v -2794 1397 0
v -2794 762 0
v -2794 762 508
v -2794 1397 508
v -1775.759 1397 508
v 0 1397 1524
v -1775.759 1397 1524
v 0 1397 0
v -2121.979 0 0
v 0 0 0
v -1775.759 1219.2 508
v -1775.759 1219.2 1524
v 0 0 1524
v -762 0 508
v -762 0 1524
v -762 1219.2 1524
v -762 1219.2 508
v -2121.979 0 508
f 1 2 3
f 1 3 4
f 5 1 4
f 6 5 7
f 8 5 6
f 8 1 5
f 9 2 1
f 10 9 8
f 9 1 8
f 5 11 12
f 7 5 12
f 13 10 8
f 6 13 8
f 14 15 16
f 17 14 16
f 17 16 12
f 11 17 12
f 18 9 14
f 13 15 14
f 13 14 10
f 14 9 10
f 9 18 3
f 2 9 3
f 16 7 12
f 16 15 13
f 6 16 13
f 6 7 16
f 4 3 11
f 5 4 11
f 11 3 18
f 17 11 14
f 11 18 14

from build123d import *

# Parameters (mm, degrees)
F0_W     = 2794
F0_H     = 1397
F1_DEPTH = 1524
F4_DEPTH = 1016
F5_W     = 1018.2407798767
F5_H     = 1016
F6_DEPTH = 3329.94
F8_DEPTH = 1772.92


with BuildPart() as f1:
    # F0 (on Top) → F1 (new body)
    with BuildSketch(Plane.XY):
        with Locations((-1397, 698.5)):
            Rectangle(F0_W, F0_H)
    extrude(amount=F1_DEPTH)

    # F3 (on face) → F4 (cut)
    with BuildSketch(Plane.XY.offset(1524)):
        Polygon((-762, 0), (-762, 1016), (-762, 1219.2), (-1775.7592201233, 1219.2), (-1775.7592201233, 0), align=None)
    extrude(amount=-F4_DEPTH, mode=Mode.SUBTRACT)

    # F5 (on face) → F6 (cut)
    with BuildSketch(Plane.XZ):
        with Locations((-2284.8796100616, 1016)):
            Rectangle(F5_W, F5_H)
    extrude(amount=-F6_DEPTH, mode=Mode.SUBTRACT)

    # F7 (on face) → F8 (cut)
    with BuildSketch(Plane.XY.offset(508)):
        Polygon((-2121.9791669896, 0), (-2794, 762), (-2794, 0), align=None)
    extrude(amount=-F8_DEPTH, mode=Mode.SUBTRACT)


solid = f1.part
